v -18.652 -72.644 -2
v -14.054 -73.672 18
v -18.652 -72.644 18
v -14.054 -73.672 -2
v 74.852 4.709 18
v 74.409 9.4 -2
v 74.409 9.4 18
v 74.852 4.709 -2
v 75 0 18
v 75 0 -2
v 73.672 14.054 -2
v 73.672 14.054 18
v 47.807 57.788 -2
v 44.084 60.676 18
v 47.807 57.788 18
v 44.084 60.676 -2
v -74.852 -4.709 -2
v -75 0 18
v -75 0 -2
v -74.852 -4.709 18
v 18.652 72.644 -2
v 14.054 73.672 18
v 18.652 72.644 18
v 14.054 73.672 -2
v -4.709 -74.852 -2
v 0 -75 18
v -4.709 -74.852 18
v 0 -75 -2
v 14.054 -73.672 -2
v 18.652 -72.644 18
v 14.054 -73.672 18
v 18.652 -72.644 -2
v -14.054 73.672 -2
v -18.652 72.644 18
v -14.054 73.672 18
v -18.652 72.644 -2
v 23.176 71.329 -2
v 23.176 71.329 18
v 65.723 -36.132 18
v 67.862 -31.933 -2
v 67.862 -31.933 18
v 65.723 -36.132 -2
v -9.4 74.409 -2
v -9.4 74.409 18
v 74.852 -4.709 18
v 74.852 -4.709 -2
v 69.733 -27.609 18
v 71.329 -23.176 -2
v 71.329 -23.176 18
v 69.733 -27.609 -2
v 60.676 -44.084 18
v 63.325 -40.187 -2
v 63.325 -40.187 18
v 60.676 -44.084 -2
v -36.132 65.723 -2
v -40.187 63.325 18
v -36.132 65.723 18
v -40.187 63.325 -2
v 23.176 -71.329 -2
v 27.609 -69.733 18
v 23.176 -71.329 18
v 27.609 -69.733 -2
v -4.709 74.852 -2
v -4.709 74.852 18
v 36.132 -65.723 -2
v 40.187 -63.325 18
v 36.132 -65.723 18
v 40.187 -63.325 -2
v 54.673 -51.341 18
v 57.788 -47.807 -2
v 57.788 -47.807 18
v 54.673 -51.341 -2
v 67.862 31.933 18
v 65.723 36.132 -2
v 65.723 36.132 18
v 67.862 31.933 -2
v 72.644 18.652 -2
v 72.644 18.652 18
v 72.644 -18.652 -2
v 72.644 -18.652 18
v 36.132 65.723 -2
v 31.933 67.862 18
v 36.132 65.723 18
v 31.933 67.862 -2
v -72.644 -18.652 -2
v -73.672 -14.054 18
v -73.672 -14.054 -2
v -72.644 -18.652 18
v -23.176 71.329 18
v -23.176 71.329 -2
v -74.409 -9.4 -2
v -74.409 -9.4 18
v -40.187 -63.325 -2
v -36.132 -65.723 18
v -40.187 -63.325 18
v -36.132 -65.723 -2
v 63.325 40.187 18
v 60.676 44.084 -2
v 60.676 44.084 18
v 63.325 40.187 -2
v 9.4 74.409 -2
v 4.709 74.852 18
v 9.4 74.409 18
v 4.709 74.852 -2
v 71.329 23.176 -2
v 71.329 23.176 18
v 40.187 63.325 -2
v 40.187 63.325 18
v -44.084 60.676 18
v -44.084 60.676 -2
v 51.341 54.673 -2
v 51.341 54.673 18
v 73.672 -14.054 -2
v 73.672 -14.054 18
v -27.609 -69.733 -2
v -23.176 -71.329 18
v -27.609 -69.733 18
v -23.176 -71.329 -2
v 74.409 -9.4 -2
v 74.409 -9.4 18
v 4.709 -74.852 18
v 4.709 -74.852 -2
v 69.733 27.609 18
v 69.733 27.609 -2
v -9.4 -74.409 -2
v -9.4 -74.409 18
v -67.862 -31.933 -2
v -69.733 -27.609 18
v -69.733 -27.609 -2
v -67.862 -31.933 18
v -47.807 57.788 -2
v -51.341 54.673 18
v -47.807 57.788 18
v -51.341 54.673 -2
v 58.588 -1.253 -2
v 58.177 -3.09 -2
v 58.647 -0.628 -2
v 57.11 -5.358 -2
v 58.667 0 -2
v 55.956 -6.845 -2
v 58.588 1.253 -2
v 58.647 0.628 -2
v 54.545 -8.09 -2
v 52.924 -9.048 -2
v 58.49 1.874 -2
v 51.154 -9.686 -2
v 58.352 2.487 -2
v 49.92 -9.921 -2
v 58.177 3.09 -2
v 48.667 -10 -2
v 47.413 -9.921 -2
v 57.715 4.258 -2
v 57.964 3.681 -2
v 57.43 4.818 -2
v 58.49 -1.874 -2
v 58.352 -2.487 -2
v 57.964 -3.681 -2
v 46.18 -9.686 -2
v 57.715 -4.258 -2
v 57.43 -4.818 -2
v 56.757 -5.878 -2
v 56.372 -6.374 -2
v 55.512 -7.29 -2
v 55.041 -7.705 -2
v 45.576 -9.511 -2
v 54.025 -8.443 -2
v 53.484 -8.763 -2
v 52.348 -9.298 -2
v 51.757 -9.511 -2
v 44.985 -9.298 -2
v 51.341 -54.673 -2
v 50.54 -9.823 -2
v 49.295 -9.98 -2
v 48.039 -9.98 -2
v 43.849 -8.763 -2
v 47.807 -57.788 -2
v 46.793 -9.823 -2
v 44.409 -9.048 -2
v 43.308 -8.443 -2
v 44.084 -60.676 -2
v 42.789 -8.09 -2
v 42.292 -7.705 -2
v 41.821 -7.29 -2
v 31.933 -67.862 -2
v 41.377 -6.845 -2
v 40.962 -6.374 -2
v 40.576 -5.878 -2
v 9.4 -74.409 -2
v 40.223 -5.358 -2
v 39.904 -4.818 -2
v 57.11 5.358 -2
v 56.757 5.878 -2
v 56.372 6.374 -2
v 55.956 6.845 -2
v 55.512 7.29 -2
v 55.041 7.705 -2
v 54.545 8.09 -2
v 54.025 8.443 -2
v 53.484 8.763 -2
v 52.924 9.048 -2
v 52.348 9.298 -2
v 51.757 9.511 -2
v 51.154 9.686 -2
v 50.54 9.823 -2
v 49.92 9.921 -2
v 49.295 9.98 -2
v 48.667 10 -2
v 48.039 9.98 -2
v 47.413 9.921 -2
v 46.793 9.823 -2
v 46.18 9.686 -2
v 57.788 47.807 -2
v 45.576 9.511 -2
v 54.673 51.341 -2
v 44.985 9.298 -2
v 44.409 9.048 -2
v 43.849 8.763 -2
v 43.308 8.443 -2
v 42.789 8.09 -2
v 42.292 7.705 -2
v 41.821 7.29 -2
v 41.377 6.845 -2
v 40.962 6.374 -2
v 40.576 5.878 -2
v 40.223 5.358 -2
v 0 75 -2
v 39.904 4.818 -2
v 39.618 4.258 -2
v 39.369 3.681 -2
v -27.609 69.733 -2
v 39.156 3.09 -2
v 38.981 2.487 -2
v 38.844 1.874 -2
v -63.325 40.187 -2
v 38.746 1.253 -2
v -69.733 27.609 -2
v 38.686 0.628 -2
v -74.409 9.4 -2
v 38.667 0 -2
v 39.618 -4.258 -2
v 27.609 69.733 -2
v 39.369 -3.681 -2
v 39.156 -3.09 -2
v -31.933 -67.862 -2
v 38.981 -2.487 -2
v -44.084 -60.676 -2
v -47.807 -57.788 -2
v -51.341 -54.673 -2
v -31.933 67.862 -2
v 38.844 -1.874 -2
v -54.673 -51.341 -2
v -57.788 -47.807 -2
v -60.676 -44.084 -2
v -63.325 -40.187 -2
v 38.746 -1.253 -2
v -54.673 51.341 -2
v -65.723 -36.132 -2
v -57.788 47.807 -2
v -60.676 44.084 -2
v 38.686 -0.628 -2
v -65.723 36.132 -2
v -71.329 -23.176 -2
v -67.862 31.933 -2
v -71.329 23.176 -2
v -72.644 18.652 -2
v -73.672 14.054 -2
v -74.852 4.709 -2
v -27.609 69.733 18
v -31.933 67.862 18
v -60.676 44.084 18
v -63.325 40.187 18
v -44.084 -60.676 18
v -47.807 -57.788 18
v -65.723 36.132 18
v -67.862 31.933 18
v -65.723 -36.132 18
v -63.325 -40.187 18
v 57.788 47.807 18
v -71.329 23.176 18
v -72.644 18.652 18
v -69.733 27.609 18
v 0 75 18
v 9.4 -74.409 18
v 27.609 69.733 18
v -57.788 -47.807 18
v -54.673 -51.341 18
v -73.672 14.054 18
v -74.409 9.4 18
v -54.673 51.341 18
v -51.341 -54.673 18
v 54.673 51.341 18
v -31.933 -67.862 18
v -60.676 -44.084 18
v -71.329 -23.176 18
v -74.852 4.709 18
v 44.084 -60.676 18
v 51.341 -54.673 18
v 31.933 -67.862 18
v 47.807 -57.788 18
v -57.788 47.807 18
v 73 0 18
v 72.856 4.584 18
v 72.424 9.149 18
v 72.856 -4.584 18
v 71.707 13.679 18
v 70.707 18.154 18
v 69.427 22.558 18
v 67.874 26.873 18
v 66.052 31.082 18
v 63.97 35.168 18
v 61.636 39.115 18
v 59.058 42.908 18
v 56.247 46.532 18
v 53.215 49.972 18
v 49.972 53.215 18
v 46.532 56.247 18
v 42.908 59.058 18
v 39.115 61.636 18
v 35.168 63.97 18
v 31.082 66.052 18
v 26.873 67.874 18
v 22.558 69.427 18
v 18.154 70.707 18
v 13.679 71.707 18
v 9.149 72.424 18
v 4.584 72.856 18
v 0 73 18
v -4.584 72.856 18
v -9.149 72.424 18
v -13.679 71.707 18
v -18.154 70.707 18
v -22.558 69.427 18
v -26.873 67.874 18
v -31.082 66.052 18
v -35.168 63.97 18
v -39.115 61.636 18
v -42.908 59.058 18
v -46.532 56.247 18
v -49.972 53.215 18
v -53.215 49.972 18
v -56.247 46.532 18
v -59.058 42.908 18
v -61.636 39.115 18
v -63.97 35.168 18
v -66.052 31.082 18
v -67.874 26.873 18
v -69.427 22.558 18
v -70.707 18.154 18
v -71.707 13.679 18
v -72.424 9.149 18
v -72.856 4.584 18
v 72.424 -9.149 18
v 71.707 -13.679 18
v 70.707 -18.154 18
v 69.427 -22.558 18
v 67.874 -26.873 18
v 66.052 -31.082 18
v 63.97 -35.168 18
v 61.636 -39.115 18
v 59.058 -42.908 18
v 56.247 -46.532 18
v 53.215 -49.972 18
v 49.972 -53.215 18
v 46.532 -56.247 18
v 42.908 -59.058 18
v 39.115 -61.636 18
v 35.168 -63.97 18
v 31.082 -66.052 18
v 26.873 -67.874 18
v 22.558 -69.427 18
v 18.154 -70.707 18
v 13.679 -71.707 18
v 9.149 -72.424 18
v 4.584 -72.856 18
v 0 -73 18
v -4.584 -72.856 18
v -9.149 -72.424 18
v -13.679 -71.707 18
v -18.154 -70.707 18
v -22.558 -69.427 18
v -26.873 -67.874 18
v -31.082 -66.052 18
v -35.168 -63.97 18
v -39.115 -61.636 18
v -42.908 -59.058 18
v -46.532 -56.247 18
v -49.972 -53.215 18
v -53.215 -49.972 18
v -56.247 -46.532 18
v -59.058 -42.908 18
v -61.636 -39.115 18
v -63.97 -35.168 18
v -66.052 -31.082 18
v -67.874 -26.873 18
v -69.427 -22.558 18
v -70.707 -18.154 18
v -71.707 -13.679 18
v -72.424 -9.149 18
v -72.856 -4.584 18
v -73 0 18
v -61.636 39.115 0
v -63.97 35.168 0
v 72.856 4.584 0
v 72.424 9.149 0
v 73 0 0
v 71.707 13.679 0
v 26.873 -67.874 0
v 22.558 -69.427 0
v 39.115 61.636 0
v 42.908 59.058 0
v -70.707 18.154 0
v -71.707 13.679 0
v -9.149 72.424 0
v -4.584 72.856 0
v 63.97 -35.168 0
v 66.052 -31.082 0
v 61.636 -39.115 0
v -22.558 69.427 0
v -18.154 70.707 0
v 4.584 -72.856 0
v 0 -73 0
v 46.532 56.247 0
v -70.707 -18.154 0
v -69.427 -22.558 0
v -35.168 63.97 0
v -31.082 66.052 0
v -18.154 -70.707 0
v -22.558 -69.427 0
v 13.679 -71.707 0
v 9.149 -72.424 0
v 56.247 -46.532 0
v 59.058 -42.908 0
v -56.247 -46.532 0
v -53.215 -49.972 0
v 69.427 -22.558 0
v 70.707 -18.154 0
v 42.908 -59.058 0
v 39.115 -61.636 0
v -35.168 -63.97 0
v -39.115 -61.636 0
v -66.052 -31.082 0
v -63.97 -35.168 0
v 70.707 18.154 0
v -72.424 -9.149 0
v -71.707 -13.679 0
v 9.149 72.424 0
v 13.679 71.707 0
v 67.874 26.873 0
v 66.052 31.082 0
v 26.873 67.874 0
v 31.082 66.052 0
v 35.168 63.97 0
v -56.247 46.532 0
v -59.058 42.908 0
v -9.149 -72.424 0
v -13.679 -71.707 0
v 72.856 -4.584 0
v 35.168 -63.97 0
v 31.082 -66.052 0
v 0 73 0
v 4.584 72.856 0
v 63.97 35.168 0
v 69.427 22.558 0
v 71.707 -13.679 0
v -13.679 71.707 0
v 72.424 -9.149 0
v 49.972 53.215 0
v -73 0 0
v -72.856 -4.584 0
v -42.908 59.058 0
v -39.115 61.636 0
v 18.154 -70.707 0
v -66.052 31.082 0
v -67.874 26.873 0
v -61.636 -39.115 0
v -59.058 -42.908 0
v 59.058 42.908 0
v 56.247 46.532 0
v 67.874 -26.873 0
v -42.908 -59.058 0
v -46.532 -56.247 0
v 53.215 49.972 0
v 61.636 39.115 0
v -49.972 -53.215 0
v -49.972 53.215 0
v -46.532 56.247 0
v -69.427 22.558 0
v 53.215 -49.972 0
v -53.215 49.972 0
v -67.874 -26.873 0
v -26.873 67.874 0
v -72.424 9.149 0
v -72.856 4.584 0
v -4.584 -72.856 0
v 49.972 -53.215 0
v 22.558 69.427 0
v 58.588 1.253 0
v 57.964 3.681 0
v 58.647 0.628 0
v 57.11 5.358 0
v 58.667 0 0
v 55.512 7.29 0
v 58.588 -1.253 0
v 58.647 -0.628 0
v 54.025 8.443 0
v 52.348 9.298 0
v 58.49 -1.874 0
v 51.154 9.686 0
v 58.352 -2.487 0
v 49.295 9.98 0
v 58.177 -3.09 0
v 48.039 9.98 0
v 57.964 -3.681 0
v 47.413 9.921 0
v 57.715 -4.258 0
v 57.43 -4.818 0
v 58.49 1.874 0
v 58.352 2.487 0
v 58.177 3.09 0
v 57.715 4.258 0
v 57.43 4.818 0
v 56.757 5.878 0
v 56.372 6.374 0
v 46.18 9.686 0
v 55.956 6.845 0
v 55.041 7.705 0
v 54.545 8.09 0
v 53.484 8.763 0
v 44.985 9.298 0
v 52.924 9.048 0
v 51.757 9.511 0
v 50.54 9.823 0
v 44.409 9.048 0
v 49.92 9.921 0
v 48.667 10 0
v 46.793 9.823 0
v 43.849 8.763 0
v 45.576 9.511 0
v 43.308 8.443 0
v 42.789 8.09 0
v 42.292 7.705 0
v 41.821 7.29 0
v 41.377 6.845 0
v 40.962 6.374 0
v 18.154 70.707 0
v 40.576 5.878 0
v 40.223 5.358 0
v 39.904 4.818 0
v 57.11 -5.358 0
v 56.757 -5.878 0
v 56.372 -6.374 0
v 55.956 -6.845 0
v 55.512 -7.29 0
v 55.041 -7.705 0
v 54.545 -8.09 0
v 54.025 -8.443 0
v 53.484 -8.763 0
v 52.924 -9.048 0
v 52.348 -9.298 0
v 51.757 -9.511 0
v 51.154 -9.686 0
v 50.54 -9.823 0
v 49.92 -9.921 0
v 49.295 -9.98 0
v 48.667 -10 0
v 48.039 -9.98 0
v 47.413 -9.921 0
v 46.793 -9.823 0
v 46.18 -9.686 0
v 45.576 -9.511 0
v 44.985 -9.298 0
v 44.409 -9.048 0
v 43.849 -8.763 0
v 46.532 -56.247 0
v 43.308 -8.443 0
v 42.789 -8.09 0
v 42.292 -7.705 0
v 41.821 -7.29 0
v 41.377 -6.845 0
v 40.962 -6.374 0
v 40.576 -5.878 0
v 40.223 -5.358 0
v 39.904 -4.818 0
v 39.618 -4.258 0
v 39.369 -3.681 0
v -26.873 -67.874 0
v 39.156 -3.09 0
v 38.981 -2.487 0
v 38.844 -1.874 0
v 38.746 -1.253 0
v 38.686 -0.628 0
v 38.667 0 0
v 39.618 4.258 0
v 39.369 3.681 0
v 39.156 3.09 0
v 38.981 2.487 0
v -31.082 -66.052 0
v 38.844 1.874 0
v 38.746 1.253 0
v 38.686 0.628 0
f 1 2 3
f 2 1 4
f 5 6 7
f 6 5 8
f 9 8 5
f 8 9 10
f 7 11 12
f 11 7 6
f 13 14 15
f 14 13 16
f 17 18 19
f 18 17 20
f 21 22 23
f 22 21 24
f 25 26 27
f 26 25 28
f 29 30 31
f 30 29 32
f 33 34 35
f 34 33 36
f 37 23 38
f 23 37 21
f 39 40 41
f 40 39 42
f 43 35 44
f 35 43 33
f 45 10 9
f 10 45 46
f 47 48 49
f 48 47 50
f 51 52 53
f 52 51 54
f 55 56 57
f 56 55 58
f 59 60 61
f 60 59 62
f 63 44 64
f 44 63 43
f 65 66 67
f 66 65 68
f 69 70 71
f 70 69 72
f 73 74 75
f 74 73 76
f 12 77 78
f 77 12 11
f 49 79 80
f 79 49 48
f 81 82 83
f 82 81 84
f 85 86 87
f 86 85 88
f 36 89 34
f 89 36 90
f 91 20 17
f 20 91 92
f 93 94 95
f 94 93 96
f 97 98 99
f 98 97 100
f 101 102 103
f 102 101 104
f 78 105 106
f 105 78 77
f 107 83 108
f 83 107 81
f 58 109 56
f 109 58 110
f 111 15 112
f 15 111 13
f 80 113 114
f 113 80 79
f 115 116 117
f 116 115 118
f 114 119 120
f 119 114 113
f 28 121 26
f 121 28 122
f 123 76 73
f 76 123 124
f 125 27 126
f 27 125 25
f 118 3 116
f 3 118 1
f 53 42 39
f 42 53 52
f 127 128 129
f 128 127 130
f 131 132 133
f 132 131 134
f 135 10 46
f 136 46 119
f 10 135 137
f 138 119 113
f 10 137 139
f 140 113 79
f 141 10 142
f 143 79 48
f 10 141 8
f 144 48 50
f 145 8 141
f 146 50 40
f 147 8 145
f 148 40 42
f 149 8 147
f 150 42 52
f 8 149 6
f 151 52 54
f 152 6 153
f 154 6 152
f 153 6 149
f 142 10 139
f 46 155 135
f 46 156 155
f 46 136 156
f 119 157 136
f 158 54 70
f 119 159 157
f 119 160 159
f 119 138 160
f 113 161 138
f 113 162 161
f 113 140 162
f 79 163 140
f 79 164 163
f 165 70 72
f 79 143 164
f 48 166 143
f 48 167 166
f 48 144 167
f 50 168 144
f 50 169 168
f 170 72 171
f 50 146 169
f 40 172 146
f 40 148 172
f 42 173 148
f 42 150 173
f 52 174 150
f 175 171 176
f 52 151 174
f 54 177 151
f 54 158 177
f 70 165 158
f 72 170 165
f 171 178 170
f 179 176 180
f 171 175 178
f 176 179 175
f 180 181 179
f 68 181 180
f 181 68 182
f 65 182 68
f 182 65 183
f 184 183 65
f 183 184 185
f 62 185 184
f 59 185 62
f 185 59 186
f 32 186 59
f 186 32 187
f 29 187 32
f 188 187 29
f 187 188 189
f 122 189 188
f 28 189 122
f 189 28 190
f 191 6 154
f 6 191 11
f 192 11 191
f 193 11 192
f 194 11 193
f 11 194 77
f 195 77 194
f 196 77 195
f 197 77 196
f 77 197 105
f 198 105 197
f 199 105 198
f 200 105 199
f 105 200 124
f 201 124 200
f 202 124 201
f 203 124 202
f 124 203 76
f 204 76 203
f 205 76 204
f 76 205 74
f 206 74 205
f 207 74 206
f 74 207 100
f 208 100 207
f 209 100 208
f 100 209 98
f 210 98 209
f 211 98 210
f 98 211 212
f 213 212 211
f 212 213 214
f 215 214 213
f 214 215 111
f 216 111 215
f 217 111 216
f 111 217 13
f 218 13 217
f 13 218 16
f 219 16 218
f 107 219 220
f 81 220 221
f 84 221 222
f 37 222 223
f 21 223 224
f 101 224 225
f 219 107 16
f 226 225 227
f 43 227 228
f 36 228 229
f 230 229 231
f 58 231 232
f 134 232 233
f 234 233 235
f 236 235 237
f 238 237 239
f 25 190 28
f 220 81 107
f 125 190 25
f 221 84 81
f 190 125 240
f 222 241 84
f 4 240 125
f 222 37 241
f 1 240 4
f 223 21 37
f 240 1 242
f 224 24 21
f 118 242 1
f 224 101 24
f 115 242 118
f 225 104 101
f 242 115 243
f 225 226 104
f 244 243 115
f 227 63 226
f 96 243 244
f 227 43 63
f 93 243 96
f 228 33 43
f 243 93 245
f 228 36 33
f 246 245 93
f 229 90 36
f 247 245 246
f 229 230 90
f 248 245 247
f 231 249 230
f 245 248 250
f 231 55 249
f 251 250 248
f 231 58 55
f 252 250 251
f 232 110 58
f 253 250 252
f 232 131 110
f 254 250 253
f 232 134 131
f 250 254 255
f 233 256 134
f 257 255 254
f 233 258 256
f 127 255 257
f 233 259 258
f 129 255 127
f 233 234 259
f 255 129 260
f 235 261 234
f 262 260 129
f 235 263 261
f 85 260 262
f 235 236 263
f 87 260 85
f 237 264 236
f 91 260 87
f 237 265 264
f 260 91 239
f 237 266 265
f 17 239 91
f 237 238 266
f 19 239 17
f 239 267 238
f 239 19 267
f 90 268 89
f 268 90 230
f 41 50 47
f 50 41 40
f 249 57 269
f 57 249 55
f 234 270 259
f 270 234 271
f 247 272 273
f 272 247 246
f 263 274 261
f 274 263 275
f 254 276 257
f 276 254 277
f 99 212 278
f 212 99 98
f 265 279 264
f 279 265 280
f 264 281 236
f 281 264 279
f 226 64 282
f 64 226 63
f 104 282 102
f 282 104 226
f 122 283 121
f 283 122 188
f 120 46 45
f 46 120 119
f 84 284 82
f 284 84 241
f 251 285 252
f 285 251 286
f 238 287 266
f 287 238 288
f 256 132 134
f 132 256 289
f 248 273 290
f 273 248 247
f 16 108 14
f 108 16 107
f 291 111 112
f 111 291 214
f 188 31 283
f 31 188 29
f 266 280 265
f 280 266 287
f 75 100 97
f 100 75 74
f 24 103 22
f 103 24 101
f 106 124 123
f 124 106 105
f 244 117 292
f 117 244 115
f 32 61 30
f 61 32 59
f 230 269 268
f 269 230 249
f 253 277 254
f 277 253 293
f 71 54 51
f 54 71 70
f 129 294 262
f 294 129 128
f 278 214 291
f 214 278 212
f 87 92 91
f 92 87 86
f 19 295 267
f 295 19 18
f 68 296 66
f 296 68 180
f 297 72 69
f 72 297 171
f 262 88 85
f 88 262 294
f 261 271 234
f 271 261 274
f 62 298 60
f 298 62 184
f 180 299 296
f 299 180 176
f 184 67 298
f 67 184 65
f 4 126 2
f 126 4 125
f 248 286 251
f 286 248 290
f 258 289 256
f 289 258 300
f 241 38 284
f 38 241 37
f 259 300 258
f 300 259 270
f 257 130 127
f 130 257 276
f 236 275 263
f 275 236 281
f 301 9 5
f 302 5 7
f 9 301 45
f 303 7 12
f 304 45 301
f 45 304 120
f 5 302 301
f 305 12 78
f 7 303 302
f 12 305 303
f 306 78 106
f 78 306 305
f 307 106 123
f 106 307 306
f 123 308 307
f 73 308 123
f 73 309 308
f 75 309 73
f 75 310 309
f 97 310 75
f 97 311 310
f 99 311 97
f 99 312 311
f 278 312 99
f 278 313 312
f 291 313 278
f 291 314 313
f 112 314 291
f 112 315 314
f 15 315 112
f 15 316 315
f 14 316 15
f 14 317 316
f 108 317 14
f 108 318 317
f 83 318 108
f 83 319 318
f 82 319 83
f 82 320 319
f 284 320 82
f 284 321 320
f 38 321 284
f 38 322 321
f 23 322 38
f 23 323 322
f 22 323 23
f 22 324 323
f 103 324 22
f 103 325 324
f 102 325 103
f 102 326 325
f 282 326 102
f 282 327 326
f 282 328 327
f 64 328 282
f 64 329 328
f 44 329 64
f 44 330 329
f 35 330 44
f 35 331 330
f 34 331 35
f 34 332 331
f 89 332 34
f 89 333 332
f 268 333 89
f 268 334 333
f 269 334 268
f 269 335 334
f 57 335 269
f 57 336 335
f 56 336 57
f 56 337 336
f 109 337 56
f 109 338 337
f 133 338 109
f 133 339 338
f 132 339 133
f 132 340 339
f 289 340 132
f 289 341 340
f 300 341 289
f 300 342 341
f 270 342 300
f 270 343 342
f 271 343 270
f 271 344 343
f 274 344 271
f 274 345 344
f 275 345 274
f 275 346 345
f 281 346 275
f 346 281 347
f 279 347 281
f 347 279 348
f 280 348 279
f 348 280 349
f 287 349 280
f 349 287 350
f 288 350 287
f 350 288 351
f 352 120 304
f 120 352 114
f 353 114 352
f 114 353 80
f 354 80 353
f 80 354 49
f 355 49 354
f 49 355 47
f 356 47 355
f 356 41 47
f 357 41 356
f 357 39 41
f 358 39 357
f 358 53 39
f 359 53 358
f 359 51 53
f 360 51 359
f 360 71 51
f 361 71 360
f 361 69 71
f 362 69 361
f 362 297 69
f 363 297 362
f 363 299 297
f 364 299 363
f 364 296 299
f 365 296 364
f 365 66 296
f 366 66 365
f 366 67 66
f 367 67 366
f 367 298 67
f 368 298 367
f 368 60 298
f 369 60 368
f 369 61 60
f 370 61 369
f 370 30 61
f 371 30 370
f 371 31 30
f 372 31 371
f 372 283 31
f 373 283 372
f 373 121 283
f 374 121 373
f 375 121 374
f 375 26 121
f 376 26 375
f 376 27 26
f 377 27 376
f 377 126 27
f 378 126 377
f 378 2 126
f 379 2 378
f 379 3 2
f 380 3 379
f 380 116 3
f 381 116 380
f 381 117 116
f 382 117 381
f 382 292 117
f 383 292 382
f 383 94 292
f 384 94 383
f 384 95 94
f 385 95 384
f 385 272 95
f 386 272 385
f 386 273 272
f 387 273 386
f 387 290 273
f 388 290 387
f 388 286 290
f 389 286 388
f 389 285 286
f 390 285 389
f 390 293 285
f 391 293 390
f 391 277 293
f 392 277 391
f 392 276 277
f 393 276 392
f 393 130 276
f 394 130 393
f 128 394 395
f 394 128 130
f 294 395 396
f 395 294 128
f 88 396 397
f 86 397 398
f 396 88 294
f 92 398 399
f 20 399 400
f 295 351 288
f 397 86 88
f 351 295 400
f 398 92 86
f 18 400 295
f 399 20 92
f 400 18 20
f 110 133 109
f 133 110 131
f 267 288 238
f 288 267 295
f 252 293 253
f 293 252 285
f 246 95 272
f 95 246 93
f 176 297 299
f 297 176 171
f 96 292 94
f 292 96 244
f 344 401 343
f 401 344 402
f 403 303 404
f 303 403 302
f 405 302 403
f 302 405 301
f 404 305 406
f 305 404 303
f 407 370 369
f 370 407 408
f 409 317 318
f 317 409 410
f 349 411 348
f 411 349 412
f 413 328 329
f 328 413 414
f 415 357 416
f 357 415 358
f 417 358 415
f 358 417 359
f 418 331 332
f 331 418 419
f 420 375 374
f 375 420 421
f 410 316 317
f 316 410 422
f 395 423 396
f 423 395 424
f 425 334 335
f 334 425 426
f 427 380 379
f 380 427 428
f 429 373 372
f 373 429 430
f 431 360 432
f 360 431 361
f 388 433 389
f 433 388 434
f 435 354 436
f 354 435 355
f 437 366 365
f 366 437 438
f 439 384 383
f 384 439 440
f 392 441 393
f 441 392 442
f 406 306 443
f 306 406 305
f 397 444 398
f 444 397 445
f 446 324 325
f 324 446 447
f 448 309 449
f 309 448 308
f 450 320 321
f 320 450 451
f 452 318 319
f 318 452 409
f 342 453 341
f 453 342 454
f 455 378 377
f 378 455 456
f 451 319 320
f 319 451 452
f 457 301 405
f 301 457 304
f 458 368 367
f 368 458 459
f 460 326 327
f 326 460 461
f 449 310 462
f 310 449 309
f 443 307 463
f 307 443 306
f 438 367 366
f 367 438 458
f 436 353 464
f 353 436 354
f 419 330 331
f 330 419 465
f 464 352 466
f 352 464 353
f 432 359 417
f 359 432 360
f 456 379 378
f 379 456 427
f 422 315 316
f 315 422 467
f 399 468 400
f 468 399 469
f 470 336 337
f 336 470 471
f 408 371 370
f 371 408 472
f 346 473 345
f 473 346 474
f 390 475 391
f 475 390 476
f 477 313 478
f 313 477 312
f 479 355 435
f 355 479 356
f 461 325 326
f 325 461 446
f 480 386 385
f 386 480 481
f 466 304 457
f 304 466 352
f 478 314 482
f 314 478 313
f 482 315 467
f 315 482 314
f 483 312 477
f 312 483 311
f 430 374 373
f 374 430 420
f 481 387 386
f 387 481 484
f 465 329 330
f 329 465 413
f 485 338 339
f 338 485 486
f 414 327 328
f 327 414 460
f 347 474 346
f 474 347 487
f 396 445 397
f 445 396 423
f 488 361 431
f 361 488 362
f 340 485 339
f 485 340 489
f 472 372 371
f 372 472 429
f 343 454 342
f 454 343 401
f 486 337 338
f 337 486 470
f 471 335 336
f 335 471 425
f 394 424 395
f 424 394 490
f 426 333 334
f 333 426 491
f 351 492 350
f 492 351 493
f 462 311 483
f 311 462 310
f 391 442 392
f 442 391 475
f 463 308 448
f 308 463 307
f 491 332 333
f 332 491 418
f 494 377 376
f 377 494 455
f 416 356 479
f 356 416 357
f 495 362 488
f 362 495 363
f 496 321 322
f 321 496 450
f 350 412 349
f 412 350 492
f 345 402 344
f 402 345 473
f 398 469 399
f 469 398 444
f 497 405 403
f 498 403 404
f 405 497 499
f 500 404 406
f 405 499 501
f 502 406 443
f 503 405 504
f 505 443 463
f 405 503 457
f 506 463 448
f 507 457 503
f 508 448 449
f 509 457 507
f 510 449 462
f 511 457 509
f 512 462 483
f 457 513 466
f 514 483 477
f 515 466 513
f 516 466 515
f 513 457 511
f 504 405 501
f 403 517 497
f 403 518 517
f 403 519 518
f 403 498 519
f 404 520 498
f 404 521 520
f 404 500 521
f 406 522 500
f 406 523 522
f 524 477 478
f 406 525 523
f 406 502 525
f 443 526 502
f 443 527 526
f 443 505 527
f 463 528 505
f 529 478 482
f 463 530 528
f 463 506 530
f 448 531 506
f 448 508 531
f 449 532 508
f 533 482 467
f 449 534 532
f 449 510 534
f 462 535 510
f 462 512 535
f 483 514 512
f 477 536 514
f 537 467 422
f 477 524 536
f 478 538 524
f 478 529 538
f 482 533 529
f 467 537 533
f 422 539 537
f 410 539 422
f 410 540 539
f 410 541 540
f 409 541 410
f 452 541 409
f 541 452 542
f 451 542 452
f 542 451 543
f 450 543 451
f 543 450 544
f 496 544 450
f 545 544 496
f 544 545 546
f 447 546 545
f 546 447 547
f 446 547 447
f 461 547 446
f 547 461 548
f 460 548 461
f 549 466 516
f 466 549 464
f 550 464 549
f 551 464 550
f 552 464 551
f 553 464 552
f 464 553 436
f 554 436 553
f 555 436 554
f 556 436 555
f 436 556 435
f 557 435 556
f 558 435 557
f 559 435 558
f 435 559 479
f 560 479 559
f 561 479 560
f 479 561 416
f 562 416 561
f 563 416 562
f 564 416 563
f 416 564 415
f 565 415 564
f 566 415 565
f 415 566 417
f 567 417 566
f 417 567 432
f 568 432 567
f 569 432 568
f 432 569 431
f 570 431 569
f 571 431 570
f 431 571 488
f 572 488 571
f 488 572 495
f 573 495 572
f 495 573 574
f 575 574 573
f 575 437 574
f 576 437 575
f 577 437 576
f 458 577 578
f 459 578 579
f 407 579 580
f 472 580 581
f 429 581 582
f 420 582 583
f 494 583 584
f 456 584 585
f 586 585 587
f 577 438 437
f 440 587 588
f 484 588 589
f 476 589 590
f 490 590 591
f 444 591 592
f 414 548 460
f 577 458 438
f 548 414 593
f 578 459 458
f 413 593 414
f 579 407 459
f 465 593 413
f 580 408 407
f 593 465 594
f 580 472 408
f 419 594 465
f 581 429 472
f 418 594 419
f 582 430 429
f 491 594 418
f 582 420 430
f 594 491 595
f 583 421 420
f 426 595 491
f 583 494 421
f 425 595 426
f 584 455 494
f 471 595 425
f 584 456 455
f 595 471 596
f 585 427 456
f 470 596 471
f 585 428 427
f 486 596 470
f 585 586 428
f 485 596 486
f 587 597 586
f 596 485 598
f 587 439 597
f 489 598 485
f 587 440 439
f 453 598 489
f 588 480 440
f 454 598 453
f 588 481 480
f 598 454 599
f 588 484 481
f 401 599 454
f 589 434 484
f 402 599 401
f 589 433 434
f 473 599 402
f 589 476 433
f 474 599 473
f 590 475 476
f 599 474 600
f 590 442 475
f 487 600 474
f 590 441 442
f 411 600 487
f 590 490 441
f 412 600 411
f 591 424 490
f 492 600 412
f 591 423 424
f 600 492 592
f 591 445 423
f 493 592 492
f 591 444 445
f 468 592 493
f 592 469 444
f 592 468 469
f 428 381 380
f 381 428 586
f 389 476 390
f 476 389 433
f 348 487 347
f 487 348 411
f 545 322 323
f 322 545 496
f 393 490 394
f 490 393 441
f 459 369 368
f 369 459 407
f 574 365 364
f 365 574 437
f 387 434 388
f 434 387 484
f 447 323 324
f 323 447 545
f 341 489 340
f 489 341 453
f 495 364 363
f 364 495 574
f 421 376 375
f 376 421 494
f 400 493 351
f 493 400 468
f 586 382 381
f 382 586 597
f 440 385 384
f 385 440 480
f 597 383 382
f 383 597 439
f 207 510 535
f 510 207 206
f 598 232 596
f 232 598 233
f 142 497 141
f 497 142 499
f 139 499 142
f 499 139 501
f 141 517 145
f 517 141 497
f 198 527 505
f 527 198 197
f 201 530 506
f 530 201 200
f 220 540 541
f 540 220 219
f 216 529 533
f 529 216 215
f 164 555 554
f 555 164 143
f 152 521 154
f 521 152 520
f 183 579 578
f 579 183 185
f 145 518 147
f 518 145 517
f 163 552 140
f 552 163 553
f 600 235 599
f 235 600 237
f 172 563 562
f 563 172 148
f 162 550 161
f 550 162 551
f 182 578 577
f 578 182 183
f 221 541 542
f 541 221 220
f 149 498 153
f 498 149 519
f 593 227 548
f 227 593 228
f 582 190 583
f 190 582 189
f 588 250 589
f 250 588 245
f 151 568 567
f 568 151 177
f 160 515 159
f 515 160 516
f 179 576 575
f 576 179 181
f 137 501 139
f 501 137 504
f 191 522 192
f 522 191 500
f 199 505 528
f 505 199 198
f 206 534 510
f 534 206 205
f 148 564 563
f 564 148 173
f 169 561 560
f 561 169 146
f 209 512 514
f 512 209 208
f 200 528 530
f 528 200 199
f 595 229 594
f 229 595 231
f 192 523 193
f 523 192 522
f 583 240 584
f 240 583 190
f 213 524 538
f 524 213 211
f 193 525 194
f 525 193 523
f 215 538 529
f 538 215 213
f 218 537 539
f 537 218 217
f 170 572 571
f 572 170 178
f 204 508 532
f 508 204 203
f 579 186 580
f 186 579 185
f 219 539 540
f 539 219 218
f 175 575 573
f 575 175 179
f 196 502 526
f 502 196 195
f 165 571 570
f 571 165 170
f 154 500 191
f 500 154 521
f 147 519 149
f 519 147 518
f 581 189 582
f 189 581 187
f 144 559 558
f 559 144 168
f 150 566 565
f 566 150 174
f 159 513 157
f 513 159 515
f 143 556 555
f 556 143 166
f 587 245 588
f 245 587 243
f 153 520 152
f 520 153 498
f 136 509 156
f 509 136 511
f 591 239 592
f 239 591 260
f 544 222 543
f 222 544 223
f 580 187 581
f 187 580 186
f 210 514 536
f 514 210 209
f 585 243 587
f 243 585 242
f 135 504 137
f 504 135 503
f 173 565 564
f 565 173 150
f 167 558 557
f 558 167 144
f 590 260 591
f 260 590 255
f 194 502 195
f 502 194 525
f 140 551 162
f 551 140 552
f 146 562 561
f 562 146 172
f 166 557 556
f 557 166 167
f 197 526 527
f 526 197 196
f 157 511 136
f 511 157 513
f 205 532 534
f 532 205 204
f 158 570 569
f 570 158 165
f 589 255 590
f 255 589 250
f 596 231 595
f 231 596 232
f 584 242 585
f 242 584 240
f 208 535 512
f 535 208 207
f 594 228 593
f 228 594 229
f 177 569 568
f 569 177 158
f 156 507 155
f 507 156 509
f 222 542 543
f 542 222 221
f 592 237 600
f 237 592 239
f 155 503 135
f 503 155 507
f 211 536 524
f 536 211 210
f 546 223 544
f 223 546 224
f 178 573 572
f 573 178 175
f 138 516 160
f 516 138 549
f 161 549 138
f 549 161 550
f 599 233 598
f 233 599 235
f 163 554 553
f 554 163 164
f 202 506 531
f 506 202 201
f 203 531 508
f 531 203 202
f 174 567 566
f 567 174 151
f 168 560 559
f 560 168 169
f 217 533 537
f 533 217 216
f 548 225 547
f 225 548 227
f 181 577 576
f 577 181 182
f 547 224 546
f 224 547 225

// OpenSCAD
$fn = 100;

$diameter = 146;

$aperature = 20;

$wall = 2;
$height = 20;
$bottom = 2;


difference() {
    translate([0,0,-$bottom]) cylinder($height,$diameter/2+$wall,$diameter/2+$wall);
    cylinder($height,$diameter/2,$diameter/2);
    translate([$diameter/3,0,-$bottom*2]) #cylinder($bottom*3,$aperature/2,$aperature/2);
}


/*
translate([0,0,$height*2]) difference() {
    cylinder($bottom,$diameter/2-1,$diameter/2-1);
    translate([$diameter/3,0,-$bottom]) #cylinder($bottom*3,$aperature/2,$aperature/2);
}
*/
